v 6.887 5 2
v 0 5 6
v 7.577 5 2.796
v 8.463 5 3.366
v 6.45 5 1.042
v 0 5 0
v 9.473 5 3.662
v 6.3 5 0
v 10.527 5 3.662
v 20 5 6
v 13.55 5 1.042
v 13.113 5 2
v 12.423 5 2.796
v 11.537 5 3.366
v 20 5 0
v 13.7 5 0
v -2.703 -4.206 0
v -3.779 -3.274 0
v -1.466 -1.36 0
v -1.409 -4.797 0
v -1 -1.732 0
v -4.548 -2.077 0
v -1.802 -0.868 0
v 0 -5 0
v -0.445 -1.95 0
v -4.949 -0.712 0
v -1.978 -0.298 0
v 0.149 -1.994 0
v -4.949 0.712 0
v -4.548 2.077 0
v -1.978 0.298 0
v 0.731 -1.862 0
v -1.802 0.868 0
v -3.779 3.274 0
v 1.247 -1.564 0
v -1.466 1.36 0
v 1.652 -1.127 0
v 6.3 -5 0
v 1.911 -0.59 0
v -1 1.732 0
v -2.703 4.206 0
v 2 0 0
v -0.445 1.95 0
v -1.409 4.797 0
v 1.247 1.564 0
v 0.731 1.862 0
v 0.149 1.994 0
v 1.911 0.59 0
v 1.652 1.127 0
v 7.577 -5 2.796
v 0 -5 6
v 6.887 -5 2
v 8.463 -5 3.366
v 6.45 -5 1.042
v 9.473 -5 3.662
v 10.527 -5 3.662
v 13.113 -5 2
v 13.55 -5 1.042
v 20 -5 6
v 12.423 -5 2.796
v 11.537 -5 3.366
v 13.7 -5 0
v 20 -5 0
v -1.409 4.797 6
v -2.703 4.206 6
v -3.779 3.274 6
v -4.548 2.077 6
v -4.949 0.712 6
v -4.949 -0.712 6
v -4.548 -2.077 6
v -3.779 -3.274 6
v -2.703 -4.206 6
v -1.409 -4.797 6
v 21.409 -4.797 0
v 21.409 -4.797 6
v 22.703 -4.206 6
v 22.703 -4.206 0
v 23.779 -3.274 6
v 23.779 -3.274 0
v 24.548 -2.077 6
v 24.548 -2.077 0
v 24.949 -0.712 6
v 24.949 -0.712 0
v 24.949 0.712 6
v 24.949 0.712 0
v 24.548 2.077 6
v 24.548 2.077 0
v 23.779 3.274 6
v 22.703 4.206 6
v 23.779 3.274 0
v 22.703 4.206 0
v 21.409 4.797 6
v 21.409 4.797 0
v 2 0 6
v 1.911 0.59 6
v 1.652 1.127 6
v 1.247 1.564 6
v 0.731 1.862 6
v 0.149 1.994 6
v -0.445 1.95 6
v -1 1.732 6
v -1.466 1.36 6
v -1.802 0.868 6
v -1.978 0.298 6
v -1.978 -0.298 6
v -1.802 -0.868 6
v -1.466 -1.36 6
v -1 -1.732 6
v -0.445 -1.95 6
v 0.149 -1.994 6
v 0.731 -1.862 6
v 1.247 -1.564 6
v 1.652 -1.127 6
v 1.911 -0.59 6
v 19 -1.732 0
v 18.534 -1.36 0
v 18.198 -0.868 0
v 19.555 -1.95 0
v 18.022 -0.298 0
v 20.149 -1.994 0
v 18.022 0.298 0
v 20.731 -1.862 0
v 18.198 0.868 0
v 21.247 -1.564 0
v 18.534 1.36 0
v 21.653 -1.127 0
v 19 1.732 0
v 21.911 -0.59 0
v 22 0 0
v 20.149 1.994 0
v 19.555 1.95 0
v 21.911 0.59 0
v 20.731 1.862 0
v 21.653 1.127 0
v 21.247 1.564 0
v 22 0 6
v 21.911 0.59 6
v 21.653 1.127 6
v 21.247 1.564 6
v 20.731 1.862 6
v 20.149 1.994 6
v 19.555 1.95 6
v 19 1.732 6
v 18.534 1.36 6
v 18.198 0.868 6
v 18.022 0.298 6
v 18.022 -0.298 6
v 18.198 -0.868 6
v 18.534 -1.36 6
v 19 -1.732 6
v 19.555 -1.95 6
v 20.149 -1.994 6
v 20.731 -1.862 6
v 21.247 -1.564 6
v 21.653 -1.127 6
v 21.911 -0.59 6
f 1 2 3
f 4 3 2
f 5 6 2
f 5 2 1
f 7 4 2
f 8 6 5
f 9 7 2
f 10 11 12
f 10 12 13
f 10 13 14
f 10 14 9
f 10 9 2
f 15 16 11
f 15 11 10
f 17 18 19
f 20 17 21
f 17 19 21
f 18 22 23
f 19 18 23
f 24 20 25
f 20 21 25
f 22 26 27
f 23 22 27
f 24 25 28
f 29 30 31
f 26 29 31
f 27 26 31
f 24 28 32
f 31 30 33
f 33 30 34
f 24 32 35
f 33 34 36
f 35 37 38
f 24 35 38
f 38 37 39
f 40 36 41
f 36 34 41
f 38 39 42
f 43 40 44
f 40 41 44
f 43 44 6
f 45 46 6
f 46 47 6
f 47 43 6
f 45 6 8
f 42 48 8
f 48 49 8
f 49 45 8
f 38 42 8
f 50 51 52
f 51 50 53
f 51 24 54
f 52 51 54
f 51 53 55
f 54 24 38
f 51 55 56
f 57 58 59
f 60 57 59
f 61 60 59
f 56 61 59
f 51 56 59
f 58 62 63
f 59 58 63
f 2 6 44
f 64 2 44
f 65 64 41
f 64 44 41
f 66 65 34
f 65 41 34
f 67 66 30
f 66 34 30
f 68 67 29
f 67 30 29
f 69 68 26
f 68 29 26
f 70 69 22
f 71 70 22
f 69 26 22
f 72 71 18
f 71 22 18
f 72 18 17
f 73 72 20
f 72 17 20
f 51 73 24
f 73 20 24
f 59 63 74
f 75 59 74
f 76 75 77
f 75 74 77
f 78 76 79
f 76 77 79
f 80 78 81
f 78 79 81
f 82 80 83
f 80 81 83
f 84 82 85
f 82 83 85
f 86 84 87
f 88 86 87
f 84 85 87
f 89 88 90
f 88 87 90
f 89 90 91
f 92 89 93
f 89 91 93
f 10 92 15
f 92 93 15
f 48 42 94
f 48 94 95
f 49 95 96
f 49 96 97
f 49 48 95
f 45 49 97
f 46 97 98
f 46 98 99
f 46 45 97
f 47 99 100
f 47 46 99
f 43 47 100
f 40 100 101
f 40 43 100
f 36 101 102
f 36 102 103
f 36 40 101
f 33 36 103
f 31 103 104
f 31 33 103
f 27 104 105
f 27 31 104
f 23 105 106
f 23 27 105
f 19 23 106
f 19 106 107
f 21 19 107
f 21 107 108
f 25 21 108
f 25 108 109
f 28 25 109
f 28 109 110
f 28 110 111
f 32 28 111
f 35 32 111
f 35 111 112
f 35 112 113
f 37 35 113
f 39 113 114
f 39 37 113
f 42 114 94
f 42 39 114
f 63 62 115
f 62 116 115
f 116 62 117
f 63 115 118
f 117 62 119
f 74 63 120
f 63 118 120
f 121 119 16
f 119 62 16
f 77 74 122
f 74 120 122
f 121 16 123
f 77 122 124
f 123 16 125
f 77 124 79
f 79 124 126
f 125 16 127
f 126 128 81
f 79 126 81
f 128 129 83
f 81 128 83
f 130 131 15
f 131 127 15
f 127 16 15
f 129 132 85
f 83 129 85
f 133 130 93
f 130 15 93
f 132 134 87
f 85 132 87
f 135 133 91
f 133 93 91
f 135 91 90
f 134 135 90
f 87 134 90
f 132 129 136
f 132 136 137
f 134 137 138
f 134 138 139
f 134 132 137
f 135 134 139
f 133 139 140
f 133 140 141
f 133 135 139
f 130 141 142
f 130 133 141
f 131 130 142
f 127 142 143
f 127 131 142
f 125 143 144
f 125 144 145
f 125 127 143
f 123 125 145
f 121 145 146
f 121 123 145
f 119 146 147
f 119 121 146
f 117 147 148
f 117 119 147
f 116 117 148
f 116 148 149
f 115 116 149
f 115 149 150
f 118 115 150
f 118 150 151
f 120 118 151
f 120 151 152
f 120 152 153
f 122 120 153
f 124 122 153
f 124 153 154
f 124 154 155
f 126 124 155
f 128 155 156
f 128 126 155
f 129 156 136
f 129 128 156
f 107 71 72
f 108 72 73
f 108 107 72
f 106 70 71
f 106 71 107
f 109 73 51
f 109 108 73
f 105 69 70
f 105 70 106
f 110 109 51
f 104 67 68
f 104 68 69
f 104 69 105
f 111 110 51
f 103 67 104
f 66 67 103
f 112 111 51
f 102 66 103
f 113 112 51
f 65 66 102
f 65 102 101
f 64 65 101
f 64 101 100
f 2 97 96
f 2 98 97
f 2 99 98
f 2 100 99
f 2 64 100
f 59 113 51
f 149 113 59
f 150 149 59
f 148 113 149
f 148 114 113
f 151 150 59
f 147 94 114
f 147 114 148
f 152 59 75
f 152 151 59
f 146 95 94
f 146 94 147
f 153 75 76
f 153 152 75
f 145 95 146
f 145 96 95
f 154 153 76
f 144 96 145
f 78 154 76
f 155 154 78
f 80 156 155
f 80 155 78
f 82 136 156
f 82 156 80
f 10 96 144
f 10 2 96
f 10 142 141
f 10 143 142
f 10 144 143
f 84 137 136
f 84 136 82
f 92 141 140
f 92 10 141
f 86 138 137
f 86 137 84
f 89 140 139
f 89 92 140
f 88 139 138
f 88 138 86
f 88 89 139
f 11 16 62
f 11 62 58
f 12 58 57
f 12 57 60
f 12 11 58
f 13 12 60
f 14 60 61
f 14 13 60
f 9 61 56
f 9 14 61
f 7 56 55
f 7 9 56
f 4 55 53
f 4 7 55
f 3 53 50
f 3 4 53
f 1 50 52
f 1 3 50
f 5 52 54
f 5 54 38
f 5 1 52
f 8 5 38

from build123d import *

# Parameters (mm, degrees)
SKETCH_R       = 2
PAD_DEPTH      = 6
CYLINDER_R     = 3.7
CYLINDER_DEPTH = 10


with BuildPart() as part:
    # Sketch → Pad (new body)
    with BuildSketch(Plane.XY):
        with BuildLine():
            ThreePointArc((2.9e-05, 5), (-5, 1e-05), (1e-05, -5))
            Line((1e-05, -5), (20.00001, -5))
            ThreePointArc((20.00001, -5), (25.000039, -1e-05), (20.000029, 5))
            Line((2.9e-05, 5), (20.000029, 5))
        make_face()
        Circle(SKETCH_R, mode=Mode.SUBTRACT)
        with Locations((20.000039, 0)):
            Circle(SKETCH_R, mode=Mode.SUBTRACT)
    extrude(amount=PAD_DEPTH)

    # Cylinder → Cylinder (cut)
    with BuildSketch(Plane(origin=(10, 5, 0), x_dir=(1, 0, 0), z_dir=(0, -1, 0))):
        Circle(CYLINDER_R)
    extrude(amount=CYLINDER_DEPTH, mode=Mode.SUBTRACT)


solid = part.part
